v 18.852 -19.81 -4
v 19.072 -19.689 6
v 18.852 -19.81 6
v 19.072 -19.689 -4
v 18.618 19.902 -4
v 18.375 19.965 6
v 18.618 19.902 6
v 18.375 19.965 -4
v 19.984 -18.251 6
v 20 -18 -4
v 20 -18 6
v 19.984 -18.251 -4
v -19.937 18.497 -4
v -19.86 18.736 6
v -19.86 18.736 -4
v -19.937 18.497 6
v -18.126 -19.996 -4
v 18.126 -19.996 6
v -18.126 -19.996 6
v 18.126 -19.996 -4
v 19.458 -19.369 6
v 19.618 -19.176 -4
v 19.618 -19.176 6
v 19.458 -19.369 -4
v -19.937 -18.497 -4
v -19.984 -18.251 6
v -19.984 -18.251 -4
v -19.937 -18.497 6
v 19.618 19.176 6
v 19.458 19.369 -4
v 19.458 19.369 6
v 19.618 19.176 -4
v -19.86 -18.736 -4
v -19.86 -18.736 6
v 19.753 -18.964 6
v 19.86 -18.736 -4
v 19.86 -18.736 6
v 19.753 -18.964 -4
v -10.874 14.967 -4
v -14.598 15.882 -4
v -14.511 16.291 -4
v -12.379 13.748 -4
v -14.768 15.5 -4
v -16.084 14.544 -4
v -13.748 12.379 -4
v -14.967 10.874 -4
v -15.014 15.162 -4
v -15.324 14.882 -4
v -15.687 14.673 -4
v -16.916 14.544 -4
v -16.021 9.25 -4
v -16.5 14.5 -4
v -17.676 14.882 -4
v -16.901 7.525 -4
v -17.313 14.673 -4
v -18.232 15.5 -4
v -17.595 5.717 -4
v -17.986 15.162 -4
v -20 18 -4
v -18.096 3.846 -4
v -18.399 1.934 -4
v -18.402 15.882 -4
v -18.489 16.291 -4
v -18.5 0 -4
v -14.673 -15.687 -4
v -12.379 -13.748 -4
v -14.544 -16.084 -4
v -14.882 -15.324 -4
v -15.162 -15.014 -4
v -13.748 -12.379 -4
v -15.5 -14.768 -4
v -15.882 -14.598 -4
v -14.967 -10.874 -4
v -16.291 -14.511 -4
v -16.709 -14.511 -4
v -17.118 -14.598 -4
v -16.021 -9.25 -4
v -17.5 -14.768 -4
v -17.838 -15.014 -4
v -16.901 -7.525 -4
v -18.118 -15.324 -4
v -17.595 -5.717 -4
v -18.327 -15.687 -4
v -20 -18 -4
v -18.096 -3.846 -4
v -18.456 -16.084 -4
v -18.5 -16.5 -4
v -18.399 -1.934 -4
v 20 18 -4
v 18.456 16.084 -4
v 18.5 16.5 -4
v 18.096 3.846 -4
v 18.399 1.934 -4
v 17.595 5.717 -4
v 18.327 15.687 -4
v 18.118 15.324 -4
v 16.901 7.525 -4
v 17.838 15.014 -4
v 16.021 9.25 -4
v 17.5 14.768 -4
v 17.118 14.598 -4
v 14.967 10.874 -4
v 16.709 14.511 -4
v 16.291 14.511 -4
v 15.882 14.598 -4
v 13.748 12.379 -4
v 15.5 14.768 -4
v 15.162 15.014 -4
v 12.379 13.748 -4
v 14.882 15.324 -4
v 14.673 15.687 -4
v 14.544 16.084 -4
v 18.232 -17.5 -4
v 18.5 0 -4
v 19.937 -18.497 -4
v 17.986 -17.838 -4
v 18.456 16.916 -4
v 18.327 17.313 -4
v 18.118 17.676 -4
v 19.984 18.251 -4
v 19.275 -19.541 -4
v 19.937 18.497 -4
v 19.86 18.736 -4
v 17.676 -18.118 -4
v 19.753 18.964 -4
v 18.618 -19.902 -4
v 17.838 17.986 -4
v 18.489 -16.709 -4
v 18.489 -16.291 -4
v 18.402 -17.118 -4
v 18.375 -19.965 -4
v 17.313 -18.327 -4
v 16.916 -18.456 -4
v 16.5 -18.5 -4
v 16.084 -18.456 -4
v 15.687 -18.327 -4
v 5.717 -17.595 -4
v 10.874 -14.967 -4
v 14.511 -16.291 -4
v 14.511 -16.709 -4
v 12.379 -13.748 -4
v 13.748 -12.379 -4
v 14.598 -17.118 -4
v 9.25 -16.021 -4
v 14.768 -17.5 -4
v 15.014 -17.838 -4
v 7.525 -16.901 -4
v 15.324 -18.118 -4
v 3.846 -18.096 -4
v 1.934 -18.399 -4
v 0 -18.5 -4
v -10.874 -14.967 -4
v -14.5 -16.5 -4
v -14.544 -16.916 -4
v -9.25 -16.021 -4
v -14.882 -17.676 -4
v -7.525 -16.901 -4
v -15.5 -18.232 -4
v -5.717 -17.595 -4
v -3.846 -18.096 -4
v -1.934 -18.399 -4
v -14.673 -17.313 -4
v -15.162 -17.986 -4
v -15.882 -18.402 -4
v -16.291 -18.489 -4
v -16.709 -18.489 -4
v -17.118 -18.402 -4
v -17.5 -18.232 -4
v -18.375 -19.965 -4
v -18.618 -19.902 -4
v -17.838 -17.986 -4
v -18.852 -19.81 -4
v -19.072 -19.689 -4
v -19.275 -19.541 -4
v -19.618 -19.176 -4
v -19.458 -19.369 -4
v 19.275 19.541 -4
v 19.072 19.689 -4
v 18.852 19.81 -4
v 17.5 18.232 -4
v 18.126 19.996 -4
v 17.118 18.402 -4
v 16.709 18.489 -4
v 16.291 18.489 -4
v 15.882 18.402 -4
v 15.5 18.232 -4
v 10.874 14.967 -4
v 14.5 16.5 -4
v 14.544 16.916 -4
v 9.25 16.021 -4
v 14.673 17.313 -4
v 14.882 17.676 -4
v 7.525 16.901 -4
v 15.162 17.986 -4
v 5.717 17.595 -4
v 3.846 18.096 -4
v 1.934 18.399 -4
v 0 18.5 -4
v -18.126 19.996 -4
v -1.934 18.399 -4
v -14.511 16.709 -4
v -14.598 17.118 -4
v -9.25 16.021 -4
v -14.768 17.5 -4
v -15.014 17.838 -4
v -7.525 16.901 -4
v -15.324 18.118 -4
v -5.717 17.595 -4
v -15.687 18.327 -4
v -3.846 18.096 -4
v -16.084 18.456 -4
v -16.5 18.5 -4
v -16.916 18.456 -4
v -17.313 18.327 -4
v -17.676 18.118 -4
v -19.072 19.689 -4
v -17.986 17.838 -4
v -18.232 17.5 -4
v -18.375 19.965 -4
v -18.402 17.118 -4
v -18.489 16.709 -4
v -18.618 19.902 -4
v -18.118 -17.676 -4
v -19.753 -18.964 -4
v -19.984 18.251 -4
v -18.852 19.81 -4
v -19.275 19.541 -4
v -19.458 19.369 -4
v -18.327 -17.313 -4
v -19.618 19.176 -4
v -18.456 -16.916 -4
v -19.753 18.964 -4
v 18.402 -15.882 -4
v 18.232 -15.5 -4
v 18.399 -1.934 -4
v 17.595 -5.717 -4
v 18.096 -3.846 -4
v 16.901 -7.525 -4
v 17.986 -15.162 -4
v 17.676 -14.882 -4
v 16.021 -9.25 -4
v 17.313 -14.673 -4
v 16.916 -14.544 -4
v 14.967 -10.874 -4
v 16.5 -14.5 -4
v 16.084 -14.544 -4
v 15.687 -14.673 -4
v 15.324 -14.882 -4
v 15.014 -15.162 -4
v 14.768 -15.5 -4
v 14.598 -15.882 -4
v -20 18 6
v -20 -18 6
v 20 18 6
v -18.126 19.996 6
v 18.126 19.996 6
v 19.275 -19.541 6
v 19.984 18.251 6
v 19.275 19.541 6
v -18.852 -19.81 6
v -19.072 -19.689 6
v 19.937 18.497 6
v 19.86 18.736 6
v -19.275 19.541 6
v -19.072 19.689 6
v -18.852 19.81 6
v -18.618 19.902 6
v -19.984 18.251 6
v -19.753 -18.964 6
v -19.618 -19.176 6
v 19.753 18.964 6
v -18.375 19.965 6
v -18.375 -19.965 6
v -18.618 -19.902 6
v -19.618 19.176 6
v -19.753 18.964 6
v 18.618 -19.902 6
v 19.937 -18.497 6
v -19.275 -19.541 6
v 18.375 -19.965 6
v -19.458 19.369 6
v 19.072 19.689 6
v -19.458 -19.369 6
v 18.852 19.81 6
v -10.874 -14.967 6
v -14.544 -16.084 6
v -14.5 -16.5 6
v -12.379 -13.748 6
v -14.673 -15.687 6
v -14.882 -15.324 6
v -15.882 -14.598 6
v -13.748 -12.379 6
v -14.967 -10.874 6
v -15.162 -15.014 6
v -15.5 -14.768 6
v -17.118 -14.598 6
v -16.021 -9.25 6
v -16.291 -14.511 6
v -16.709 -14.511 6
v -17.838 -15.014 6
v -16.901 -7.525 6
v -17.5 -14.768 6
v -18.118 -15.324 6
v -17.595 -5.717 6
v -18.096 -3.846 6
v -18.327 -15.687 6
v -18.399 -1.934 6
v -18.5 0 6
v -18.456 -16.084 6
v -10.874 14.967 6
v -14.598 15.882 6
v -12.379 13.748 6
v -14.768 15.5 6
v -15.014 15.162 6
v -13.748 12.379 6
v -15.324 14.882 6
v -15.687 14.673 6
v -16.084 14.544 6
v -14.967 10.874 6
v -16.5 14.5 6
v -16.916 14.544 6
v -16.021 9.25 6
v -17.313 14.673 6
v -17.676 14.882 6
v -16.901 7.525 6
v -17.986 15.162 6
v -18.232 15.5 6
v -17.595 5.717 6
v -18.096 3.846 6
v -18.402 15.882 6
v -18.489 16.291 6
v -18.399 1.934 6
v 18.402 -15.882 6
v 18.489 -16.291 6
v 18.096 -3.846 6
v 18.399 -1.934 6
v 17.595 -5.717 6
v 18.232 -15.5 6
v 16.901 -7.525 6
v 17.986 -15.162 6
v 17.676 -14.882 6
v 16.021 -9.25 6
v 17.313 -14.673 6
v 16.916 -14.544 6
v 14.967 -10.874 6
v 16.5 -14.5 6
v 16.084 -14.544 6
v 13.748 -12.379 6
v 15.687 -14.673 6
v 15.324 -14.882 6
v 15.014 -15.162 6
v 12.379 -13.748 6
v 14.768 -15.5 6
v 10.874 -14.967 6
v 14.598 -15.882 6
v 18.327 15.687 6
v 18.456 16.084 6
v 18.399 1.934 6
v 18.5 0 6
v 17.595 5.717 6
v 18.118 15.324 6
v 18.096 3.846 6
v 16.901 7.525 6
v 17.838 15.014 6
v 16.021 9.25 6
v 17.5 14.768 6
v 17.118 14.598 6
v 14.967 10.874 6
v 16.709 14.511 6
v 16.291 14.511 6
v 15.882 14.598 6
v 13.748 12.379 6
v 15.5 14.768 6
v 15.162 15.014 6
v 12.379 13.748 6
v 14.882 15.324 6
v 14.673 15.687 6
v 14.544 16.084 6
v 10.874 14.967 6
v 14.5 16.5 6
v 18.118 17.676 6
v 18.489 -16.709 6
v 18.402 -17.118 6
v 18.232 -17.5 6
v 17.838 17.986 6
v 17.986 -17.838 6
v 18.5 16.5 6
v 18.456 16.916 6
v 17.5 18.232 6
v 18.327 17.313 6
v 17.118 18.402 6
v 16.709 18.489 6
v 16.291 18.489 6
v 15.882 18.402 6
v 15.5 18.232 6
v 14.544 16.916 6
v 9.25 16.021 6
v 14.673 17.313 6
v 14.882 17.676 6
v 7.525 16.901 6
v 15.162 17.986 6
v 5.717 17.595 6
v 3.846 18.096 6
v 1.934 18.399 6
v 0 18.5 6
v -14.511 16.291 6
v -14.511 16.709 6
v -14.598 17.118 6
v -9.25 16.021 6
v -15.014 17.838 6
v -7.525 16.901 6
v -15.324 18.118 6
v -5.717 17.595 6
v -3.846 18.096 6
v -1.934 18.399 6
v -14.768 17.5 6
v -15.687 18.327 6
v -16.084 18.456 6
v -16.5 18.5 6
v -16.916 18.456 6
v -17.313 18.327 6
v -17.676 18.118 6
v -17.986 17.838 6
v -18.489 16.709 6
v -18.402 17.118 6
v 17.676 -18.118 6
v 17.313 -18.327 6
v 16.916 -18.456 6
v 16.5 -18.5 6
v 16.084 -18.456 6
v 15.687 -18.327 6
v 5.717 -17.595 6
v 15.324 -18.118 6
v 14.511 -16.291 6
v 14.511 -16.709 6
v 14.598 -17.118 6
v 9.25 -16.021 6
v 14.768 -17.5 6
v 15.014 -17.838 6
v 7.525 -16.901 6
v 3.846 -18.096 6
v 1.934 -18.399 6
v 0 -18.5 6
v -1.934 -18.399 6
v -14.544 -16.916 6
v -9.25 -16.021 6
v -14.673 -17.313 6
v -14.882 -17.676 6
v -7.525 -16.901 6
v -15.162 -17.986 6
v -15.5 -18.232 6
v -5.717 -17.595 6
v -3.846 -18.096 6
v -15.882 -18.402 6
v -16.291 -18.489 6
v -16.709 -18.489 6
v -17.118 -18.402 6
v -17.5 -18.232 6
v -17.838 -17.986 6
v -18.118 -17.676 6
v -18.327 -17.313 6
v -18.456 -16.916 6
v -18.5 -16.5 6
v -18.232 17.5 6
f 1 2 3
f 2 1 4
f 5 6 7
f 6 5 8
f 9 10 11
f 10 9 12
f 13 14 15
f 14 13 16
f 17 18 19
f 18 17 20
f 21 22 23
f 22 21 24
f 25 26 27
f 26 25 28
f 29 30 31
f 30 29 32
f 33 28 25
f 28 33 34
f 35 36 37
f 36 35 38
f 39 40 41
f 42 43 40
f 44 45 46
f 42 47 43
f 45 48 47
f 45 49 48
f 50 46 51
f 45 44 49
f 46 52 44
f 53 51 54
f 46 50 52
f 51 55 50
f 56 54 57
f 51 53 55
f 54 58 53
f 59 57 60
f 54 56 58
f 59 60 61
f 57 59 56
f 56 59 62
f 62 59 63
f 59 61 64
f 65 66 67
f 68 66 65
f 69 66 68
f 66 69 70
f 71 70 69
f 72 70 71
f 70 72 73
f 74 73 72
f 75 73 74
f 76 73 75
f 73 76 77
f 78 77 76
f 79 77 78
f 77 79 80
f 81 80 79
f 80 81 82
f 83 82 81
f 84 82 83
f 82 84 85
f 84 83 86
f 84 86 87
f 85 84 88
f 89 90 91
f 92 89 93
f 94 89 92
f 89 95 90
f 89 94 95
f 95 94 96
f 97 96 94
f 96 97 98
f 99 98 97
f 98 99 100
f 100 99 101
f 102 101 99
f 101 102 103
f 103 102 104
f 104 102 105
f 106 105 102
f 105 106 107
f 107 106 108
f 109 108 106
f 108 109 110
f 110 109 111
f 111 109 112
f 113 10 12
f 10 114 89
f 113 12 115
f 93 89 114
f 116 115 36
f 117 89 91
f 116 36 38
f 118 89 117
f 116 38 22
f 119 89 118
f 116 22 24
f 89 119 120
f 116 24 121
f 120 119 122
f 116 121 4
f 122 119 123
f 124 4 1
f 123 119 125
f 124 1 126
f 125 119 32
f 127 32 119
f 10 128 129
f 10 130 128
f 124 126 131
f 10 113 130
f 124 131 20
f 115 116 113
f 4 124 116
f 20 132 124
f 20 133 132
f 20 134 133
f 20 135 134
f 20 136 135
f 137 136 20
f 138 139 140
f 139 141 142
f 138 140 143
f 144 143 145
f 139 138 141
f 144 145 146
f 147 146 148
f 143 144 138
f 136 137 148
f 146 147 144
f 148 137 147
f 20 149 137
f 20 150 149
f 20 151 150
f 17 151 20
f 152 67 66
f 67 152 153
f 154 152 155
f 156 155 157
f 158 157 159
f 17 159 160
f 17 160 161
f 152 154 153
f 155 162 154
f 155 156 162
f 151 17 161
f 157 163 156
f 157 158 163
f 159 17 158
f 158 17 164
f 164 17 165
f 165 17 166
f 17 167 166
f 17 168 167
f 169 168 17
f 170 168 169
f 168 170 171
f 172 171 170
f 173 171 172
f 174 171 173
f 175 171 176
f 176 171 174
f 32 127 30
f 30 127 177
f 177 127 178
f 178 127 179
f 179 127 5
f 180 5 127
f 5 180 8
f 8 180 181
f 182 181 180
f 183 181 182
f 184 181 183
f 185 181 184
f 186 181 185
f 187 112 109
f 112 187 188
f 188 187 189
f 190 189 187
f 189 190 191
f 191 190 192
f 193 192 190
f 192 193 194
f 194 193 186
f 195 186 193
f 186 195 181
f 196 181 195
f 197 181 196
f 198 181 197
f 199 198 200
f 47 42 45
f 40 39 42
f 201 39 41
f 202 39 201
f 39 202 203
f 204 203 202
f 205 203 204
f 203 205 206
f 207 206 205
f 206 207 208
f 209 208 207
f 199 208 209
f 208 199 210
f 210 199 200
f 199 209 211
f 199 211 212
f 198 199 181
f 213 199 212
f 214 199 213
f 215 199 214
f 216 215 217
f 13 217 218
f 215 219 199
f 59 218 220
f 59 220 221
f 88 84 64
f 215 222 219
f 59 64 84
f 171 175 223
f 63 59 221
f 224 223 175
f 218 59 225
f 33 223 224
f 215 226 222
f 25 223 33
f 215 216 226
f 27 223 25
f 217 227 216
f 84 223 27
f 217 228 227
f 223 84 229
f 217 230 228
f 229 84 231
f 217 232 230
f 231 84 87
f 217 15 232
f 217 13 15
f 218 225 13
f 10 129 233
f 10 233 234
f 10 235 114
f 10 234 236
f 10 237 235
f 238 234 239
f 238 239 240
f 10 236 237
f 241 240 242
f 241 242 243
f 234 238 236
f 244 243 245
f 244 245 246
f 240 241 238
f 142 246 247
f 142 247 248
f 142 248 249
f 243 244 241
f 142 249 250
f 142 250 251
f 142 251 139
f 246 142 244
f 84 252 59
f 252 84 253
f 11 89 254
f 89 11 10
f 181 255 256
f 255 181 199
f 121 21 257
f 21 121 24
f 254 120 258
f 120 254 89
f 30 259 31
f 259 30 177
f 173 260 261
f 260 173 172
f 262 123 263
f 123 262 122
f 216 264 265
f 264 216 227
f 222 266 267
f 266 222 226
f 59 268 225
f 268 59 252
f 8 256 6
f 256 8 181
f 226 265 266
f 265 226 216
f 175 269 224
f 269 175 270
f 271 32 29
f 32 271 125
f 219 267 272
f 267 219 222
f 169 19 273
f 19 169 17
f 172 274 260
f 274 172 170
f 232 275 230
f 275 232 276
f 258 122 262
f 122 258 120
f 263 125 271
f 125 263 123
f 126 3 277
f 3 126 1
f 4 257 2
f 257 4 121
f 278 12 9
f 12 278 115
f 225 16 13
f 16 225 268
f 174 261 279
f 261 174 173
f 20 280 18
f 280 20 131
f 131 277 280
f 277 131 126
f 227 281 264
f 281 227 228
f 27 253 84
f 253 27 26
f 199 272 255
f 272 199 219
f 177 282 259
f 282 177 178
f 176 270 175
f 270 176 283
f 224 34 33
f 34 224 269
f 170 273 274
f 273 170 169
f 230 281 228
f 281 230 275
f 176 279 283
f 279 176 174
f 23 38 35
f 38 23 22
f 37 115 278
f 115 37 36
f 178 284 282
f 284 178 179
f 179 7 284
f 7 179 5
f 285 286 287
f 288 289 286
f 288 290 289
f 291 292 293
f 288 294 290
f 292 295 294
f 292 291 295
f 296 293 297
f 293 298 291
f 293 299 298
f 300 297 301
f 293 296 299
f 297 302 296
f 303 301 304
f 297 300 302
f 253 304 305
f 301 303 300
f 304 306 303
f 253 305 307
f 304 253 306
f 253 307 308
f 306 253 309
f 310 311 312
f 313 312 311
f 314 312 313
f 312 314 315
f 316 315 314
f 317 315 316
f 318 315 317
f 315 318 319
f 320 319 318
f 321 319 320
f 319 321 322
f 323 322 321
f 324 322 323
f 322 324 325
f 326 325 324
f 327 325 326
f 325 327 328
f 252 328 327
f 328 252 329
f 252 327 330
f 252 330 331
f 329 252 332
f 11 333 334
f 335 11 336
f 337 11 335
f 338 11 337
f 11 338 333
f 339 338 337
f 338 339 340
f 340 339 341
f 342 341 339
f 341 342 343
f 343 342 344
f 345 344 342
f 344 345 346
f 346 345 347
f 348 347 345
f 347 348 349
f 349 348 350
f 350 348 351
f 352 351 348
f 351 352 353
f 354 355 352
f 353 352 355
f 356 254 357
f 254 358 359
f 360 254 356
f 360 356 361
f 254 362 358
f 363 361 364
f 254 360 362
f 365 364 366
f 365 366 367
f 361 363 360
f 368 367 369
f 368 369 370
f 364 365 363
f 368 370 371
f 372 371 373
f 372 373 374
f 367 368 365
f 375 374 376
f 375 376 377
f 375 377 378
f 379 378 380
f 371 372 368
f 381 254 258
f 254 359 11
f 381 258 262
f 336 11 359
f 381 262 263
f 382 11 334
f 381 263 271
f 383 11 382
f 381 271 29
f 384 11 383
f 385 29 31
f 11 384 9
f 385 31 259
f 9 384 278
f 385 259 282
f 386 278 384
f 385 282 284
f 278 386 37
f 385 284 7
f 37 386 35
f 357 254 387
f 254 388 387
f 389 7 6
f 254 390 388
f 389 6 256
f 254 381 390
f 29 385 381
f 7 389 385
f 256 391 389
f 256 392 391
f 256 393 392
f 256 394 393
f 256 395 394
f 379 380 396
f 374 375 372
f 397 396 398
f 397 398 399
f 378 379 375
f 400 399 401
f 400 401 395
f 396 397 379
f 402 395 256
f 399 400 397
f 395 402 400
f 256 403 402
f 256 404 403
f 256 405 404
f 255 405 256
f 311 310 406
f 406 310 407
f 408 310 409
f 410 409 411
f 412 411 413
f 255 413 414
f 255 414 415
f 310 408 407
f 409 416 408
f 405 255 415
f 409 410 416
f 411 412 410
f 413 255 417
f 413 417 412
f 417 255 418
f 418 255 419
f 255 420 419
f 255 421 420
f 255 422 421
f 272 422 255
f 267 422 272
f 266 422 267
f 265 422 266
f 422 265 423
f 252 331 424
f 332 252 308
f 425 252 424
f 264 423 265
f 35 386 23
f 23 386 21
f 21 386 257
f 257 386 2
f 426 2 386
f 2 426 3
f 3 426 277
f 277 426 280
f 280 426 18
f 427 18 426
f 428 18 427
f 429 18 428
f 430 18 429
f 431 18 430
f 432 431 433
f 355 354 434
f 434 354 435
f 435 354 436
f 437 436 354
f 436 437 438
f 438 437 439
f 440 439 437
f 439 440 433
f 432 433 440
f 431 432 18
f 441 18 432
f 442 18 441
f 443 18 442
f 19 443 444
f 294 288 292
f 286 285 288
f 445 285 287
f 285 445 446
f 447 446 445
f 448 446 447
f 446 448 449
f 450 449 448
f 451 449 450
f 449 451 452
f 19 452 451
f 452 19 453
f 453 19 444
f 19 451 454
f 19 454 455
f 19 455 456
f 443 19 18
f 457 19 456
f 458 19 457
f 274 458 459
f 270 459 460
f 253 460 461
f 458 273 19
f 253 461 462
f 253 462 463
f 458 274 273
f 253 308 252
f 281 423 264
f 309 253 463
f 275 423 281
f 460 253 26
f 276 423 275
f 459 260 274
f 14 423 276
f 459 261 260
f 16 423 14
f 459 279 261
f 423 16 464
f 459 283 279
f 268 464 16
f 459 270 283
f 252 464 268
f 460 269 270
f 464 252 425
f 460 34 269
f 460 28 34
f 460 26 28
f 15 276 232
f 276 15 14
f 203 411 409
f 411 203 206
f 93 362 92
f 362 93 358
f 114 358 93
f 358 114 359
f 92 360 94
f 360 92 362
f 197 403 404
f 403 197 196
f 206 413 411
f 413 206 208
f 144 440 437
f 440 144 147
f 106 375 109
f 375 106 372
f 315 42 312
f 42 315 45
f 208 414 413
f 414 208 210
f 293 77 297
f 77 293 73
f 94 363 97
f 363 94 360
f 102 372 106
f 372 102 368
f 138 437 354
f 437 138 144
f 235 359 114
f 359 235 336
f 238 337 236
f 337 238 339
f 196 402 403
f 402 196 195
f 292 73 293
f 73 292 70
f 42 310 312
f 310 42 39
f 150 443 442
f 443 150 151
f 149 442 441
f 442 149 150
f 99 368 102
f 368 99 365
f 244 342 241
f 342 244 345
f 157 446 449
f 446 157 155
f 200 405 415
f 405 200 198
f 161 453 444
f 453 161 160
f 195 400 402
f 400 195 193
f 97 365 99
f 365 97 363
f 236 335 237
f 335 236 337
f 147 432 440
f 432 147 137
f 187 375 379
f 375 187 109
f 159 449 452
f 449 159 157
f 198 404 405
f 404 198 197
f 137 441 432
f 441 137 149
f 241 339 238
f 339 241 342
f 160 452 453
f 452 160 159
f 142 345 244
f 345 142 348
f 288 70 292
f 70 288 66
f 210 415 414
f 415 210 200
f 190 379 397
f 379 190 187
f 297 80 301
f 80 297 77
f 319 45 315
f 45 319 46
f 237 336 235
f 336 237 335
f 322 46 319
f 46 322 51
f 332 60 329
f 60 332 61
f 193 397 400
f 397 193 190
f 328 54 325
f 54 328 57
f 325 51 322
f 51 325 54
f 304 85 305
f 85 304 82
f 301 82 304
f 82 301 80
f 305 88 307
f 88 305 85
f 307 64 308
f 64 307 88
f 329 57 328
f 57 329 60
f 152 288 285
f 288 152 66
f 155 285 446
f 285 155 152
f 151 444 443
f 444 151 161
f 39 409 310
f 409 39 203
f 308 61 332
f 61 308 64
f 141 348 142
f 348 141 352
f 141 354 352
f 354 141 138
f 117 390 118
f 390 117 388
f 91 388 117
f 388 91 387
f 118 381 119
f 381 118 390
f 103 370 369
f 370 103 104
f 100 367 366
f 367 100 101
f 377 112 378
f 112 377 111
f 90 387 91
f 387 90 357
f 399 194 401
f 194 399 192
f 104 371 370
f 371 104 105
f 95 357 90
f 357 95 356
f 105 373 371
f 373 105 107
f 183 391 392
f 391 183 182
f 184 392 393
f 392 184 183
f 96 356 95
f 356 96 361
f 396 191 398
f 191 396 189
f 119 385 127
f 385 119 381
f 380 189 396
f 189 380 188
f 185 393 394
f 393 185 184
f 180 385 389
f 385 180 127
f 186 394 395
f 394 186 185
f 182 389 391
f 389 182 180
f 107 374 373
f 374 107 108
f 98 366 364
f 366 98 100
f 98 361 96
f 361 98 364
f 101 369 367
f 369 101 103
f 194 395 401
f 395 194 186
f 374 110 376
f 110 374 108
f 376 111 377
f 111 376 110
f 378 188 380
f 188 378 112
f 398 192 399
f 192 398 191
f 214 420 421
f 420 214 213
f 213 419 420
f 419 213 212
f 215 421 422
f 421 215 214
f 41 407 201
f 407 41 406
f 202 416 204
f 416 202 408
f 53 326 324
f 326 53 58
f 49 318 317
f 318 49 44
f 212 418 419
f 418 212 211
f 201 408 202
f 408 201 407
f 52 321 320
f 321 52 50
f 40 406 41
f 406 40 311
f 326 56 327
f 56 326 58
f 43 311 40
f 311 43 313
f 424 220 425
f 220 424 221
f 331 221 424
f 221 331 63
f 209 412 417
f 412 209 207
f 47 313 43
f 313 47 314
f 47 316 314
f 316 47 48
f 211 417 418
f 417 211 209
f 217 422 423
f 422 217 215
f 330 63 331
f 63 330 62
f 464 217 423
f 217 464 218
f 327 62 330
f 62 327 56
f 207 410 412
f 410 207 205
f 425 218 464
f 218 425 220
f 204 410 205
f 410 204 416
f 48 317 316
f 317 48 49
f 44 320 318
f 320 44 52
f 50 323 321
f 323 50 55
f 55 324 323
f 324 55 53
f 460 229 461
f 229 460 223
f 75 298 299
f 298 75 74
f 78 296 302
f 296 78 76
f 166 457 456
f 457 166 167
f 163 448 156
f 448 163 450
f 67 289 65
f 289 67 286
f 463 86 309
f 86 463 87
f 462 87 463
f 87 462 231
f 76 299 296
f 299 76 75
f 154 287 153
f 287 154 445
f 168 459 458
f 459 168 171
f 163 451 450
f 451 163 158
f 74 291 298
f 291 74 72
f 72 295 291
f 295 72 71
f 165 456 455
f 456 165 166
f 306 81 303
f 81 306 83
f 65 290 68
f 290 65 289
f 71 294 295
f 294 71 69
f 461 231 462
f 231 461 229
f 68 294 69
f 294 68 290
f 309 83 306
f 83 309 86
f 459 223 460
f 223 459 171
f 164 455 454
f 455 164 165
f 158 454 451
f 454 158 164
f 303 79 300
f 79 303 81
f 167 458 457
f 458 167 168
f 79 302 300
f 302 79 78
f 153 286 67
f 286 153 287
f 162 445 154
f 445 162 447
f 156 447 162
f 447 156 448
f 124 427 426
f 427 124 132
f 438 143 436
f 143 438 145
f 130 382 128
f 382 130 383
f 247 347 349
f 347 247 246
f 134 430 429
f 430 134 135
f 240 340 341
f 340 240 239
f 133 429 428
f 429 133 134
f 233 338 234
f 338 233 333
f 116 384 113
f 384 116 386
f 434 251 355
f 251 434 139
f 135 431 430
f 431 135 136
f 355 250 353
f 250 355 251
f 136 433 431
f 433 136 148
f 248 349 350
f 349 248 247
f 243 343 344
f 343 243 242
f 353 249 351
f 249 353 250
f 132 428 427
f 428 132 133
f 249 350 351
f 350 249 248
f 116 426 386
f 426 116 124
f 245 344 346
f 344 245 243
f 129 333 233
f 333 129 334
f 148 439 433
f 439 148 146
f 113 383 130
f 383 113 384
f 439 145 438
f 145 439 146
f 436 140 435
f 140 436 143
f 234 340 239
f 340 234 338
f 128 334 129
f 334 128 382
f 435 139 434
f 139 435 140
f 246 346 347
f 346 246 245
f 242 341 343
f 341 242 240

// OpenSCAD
fan_width = 40;
rounded_corner = 2;


module fan(){
	$fn=50;
	difference(){
		union(){
			difference(){
				union(){
					translate([0,0,0])	minkowski() {
		    			cube([fan_width-2*rounded_corner,fan_width-2*rounded_corner,8], center=true);
		    			// rounded corners
		    			cylinder(r=rounded_corner,h=2);
					}
				}
				translate([0,0,1]) cylinder(h=14, r=37/2, $fn=60, center=true);
			}
	
		}
		for (i=[0:3]){
			rotate([0,0,90*i]) translate([16.5,16.5,1]) cylinder(h=11, r=4/2, $fn=30, center=true);
		}

	}
}

fan();
